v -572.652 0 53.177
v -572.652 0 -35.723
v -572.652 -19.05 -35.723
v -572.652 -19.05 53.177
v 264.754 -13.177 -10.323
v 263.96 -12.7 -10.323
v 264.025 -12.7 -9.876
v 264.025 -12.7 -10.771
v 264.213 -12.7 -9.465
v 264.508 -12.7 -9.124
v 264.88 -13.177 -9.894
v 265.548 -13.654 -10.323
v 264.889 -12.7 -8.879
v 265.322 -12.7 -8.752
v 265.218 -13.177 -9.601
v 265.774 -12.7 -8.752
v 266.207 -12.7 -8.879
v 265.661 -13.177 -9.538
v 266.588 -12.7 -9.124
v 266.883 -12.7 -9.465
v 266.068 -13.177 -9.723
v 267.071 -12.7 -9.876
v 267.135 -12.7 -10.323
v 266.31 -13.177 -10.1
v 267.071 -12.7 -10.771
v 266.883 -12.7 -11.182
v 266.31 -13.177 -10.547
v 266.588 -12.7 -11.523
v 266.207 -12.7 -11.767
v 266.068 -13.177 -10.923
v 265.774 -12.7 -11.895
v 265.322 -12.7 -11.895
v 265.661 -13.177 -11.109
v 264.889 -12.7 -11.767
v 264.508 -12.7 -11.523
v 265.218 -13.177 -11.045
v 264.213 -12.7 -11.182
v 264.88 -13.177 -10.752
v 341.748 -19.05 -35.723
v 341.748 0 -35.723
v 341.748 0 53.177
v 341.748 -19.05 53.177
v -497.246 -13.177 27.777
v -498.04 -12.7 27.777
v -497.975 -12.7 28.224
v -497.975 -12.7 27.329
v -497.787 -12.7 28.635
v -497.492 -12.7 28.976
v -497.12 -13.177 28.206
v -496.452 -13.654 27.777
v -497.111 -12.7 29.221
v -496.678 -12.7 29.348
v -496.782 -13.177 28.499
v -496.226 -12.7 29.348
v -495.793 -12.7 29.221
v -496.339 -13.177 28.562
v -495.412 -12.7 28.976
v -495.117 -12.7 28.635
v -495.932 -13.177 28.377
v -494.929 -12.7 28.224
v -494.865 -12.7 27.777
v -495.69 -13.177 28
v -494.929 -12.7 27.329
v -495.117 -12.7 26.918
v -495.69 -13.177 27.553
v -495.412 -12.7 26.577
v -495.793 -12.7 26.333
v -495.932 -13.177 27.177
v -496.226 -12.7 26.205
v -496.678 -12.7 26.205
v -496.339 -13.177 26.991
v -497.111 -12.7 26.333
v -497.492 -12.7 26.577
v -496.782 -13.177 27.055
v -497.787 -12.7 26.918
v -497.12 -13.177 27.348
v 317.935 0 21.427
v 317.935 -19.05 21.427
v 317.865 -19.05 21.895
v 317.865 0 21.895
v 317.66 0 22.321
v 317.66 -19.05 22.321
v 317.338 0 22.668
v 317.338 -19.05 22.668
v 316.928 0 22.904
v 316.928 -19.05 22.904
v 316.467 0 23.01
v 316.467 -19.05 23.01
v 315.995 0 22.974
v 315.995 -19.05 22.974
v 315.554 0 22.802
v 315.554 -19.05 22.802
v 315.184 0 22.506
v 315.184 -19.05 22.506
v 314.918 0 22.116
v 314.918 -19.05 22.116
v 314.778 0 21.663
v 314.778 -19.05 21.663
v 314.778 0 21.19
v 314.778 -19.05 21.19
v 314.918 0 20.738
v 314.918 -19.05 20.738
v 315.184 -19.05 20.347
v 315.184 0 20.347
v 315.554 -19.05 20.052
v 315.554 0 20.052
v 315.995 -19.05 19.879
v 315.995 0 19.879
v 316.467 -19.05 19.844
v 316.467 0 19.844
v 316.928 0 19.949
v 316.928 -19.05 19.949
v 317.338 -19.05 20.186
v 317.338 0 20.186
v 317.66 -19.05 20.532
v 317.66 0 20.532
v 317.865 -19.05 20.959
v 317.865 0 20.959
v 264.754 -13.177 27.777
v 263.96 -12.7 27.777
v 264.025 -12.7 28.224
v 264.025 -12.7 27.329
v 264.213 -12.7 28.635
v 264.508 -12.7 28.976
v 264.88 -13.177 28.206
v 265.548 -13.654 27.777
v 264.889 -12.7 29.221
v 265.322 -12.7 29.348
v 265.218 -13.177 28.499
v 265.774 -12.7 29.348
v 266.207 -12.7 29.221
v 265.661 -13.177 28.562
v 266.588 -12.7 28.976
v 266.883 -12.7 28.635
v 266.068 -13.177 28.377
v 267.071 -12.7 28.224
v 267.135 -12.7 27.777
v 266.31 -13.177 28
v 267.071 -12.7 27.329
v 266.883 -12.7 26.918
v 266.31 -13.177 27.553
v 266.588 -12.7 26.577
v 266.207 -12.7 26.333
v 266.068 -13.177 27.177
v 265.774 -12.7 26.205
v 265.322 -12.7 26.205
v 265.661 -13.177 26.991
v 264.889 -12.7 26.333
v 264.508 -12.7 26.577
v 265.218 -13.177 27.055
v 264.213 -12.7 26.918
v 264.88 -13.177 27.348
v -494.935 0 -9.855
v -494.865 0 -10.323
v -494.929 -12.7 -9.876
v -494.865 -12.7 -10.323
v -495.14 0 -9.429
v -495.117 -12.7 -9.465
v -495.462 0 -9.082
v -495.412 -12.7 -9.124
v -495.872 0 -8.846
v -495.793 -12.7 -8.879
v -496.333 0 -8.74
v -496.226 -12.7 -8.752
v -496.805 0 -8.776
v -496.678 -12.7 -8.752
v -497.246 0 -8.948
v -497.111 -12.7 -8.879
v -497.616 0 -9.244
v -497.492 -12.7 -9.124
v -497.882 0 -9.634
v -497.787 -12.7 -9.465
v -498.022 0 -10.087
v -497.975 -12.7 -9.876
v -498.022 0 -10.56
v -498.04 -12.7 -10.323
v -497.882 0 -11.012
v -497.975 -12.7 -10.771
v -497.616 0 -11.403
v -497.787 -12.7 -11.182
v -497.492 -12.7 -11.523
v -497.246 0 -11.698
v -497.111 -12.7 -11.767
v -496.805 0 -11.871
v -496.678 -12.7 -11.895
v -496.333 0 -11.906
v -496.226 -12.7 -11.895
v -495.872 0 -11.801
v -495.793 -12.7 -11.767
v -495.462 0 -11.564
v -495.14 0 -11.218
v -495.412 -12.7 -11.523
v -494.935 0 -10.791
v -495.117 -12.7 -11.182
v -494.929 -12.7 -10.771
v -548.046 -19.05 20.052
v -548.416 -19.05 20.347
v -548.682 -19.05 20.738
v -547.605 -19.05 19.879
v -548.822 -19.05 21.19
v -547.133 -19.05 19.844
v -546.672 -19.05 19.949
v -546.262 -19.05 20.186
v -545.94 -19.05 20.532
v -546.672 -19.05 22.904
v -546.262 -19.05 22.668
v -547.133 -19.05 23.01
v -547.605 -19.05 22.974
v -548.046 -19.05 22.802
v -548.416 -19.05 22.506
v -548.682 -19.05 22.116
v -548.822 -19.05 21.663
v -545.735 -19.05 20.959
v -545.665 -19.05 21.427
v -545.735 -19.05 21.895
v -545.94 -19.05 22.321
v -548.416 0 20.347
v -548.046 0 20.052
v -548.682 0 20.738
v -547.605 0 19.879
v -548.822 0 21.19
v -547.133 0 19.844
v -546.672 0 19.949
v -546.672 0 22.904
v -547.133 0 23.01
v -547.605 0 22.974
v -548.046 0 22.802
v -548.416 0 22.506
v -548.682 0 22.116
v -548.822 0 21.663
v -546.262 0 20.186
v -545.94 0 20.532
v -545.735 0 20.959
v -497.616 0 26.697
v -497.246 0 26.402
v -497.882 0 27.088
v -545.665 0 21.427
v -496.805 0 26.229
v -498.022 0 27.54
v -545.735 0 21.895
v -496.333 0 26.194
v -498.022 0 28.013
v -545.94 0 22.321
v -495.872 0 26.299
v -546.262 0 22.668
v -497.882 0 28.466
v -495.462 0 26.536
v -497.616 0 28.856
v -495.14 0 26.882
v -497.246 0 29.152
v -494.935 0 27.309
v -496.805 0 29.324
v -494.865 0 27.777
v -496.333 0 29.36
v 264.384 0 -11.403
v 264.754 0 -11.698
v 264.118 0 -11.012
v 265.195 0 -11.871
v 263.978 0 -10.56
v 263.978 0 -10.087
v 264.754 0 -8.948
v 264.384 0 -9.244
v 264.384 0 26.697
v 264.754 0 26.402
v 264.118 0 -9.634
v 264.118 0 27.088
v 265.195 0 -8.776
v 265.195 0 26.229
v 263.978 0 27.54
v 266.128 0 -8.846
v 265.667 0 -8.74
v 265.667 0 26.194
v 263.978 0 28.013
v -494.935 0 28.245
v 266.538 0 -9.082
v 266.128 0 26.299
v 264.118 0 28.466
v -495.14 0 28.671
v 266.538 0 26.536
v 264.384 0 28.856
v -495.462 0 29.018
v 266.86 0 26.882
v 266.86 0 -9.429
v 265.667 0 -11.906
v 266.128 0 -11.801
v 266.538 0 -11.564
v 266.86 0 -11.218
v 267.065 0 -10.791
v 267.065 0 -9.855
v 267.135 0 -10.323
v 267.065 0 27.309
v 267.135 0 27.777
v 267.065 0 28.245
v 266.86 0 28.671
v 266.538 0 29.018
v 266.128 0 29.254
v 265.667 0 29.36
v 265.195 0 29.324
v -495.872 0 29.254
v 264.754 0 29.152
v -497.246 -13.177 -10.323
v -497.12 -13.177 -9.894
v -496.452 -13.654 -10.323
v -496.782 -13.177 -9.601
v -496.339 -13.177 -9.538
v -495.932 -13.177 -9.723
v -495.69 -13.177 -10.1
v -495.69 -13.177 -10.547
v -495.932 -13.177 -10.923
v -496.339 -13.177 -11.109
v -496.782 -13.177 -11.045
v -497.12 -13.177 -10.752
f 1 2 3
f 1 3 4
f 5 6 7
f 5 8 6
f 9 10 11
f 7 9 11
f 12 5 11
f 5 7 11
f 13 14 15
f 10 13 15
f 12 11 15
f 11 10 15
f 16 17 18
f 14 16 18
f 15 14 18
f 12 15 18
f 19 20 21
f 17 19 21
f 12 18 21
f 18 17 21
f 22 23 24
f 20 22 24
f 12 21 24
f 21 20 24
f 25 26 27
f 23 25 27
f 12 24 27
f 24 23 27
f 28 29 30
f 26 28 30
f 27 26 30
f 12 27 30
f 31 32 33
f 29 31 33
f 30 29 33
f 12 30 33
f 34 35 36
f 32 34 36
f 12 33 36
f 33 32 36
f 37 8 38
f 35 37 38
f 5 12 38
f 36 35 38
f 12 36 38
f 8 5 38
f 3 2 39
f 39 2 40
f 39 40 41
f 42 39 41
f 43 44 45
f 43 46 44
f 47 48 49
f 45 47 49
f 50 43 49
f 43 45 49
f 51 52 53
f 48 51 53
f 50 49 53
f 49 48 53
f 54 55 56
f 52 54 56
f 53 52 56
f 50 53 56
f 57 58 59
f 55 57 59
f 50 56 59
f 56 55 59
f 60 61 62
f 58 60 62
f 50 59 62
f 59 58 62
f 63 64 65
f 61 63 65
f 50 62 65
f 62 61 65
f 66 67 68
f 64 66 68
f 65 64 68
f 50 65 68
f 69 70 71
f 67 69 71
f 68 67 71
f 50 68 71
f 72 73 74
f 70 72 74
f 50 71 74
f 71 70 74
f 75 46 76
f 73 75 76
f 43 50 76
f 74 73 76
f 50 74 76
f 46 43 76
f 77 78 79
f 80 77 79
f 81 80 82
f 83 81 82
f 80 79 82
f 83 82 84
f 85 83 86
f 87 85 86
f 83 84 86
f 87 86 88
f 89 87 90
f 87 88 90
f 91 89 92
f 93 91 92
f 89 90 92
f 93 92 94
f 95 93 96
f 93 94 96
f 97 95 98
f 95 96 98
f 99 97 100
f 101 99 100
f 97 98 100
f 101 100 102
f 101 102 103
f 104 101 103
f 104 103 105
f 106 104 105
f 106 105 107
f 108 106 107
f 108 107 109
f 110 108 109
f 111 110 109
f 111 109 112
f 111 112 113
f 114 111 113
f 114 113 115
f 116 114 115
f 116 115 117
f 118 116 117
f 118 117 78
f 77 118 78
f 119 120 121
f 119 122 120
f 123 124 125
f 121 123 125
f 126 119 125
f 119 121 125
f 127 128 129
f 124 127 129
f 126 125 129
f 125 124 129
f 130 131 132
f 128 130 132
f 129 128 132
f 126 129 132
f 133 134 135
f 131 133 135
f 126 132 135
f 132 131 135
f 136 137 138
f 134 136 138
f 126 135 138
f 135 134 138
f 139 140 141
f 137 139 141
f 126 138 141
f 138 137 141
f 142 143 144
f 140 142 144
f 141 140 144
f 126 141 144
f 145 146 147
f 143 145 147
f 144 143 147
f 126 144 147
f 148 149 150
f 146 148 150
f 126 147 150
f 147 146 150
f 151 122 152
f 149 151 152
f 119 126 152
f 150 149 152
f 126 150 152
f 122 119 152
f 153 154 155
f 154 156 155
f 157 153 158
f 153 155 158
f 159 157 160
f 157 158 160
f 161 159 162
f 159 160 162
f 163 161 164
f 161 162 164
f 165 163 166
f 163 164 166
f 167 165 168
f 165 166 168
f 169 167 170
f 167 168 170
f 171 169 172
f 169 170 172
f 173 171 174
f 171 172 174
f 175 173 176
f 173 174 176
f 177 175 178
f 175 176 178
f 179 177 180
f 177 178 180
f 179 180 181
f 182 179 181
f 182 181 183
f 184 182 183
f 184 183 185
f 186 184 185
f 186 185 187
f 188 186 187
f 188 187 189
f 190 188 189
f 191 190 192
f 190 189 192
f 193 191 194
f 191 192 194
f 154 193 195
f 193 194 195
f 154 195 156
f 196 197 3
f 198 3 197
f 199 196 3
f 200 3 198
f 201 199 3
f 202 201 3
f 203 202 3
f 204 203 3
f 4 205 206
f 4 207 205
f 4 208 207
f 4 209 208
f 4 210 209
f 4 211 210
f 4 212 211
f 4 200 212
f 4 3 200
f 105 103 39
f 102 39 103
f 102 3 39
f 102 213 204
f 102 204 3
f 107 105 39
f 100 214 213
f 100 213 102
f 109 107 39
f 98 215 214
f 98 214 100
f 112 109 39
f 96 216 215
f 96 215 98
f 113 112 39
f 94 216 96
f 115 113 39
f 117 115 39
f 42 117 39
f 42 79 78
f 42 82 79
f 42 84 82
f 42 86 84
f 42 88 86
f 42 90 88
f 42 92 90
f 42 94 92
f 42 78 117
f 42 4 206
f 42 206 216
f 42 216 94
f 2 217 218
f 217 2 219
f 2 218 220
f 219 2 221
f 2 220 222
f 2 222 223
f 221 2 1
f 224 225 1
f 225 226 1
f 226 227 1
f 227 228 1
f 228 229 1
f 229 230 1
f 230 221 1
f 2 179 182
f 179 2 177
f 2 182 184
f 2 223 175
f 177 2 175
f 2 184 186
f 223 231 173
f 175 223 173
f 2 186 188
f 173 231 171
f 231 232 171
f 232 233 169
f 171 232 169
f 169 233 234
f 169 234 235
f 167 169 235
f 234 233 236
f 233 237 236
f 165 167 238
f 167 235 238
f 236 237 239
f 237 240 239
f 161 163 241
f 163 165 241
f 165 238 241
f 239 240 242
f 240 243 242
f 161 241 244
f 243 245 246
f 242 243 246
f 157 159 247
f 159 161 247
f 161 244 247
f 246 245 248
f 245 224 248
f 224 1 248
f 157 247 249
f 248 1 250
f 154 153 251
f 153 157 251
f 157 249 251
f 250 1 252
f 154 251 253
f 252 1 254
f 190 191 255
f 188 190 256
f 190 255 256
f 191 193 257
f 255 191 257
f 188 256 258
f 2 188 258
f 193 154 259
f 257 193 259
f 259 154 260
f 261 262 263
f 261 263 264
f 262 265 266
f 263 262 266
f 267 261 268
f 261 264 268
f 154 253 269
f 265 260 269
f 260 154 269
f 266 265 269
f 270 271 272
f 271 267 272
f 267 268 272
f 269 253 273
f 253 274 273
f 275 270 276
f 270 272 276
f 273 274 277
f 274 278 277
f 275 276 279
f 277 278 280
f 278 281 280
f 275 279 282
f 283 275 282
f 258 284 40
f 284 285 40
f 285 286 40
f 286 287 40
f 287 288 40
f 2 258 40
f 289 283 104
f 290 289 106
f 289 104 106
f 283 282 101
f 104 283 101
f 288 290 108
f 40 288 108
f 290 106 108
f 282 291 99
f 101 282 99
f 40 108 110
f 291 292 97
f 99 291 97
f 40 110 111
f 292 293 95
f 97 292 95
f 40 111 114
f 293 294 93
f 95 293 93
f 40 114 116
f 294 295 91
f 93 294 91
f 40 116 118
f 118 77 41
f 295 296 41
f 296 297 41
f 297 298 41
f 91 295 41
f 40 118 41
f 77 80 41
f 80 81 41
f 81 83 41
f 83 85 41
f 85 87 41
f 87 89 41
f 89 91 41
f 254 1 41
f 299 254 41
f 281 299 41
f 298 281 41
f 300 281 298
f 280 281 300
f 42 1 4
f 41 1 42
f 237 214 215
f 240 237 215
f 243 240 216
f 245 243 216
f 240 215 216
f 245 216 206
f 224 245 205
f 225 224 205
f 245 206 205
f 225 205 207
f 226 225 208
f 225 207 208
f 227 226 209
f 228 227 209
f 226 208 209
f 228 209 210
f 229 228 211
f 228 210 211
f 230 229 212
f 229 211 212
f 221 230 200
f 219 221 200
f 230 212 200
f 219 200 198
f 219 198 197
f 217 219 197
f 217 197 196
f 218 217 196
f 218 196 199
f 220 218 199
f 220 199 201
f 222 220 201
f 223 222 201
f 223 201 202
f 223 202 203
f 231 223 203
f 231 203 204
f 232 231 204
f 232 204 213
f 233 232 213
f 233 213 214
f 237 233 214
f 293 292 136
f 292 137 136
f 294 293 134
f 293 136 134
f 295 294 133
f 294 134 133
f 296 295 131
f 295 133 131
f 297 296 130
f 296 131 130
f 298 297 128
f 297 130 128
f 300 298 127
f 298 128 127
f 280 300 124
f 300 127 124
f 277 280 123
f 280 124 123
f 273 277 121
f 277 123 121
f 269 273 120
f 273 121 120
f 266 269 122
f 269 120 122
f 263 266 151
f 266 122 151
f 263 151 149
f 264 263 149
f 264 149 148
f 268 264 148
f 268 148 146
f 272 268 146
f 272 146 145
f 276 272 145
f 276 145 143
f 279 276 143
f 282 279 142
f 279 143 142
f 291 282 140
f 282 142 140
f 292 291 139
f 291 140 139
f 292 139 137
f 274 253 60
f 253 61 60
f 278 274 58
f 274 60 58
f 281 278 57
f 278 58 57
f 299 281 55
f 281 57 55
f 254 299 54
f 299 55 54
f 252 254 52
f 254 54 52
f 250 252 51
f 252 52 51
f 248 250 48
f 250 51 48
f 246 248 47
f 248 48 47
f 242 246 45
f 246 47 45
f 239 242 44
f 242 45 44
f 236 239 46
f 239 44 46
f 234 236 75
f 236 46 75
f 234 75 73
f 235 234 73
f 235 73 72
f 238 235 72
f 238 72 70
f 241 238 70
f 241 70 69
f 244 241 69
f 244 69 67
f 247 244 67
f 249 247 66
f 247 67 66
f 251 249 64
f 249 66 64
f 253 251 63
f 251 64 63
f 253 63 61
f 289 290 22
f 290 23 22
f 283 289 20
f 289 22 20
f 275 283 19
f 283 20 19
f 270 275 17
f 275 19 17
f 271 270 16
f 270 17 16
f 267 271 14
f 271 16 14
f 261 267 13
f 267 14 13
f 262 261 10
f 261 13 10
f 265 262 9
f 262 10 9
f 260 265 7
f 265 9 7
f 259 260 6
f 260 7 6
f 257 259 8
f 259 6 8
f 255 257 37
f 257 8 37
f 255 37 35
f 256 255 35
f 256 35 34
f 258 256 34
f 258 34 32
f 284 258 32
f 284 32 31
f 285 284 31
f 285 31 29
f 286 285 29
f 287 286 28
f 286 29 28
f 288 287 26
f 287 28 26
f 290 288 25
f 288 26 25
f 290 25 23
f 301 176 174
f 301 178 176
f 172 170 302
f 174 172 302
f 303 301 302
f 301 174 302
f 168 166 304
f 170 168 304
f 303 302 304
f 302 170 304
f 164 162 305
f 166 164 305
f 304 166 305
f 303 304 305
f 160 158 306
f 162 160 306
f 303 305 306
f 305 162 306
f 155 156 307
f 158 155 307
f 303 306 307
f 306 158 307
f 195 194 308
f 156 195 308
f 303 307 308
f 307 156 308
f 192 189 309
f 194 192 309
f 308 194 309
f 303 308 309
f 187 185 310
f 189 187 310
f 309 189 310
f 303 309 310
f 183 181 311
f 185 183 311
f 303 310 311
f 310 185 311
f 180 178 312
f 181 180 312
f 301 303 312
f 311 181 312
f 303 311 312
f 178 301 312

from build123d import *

# Parameters (mm, degrees)
F0_W     = 914.4
F0_H     = 88.9
F1_DEPTH = 19.05
F3_D     = 3.175
F3_DEPTH = 12.7
F3_TIP   = 0.9538662327
F5_D     = 3.175


with BuildPart() as f1:
    # F0 (on Front) → F1 (new body)
    with BuildSketch(Plane.XZ):
        with Locations((-115.452008301, 8.7267147488)):
            Rectangle(F0_W, F0_H)
    extrude(amount=F1_DEPTH)

    # F3
    with Locations(Plane(origin=(0, 0, 0), x_dir=(-1, 0, 0), z_dir=(0, 1, 0))):
        with Locations((-265.547991699, -10.3232852512), (-265.547991699, 27.7767147488), (496.452008301, -10.3232852512), (496.452008301, 27.7767147488)):
            Hole(F3_D / 2, depth=F3_DEPTH)
            with Locations((0, 0, -(F3_DEPTH + F3_TIP / 2))):  # 118° drill point
                Cone(0, F3_D / 2, F3_TIP, mode=Mode.SUBTRACT)

    # F5 (through all)
    with Locations(Plane(origin=(0, 0, 0), x_dir=(-1, 0, 0), z_dir=(0, 1, 0))):
        with Locations((-316.347991699, 21.4267147488), (547.252008301, 21.4267147488)):
            Hole(F5_D / 2)


solid = f1.part
